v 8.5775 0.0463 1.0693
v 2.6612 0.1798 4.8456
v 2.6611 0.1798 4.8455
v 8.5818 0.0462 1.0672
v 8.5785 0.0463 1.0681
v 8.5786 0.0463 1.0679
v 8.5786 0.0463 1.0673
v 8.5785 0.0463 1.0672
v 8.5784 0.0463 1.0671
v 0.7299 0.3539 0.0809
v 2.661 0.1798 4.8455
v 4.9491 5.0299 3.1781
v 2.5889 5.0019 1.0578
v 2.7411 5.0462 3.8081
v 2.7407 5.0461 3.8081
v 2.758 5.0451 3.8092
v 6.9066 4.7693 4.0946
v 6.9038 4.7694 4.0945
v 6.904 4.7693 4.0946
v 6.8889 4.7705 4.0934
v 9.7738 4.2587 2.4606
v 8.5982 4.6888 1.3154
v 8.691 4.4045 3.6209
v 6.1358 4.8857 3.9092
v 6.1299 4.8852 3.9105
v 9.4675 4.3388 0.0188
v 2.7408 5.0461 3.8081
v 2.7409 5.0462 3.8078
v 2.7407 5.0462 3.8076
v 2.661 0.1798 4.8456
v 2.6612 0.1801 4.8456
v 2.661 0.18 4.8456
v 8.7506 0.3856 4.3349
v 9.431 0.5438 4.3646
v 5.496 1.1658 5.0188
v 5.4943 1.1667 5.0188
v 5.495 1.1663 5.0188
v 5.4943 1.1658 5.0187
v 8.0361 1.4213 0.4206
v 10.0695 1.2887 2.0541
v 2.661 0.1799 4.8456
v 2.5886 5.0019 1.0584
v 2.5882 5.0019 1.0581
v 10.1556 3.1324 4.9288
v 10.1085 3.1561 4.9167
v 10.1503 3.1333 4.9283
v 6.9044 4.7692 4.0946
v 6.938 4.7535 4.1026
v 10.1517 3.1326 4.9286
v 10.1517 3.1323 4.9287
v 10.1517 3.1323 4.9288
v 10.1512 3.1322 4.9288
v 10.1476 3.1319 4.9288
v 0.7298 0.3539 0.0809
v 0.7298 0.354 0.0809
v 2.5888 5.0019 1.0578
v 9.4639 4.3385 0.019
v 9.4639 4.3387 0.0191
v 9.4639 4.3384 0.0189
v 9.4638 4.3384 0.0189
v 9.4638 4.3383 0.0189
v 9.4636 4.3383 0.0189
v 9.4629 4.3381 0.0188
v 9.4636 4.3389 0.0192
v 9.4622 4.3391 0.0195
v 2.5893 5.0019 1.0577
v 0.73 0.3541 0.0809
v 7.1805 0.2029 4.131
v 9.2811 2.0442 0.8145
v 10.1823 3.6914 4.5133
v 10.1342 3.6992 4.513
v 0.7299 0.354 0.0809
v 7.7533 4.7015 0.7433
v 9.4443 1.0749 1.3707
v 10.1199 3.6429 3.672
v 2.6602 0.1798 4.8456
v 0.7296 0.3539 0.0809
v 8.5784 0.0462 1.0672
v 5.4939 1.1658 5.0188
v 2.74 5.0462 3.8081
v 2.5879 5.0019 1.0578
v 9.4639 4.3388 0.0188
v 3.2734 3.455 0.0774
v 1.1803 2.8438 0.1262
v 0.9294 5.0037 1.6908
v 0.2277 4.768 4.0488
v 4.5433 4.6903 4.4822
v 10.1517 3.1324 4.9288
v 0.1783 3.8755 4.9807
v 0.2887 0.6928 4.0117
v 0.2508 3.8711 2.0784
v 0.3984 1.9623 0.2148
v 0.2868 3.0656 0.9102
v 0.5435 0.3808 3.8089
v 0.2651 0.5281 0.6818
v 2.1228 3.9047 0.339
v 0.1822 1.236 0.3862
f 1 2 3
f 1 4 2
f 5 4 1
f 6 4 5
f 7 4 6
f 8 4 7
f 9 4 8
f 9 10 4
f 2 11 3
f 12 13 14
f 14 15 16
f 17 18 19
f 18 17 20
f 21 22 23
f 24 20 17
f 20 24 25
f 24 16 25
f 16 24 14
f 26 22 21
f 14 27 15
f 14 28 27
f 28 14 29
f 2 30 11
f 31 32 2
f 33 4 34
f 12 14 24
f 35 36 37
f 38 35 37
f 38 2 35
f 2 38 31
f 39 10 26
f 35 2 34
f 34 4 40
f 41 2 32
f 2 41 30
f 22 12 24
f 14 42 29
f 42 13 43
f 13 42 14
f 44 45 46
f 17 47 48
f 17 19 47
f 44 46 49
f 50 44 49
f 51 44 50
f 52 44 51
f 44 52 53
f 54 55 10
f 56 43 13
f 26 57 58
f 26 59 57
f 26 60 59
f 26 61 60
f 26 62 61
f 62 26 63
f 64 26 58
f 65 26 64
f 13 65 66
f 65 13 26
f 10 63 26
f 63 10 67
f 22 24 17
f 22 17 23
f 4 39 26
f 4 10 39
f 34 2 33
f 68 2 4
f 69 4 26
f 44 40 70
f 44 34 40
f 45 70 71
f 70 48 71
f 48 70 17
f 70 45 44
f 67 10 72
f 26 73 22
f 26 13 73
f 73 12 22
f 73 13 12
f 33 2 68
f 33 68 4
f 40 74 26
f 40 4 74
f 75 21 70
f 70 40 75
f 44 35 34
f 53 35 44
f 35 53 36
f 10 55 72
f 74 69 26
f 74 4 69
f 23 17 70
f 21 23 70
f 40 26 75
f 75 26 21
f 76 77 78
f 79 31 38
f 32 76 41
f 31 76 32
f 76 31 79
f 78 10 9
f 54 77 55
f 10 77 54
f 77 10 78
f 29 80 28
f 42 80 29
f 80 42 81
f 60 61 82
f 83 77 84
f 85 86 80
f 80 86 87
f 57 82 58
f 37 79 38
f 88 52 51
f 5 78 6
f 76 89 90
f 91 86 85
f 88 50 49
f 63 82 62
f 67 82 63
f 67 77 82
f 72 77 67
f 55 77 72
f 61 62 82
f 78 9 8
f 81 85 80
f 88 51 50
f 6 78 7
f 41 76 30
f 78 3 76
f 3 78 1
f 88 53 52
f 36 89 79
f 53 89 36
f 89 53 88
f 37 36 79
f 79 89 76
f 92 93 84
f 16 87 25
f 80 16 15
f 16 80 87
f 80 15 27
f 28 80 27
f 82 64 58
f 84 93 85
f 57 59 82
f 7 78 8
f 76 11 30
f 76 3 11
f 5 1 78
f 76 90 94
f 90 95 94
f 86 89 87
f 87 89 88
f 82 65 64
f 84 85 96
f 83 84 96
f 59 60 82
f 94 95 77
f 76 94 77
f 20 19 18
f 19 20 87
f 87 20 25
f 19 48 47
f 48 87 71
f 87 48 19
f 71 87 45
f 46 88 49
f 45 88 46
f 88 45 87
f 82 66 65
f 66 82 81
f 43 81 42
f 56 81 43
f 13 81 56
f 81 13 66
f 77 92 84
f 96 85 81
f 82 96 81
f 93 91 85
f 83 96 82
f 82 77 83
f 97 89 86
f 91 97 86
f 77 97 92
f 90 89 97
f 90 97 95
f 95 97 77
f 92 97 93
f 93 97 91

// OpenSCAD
m=500;
n=150;
g=3;
p=[for(i=[1 :n])[rnd(0,m),rnd(0,m),rnd(0,m)] ];
  
for (d=[1:g]){
resize([10,5,5])hull(){
        polyhedron(
p,
[for(i=[1 :m/g])[rnd(0,n),rnd(0,n),rnd(0,n)] ]

)
    ; }}

function rnd(a,b)=a+(rands(0,1,1)[0])*(b-a);     
